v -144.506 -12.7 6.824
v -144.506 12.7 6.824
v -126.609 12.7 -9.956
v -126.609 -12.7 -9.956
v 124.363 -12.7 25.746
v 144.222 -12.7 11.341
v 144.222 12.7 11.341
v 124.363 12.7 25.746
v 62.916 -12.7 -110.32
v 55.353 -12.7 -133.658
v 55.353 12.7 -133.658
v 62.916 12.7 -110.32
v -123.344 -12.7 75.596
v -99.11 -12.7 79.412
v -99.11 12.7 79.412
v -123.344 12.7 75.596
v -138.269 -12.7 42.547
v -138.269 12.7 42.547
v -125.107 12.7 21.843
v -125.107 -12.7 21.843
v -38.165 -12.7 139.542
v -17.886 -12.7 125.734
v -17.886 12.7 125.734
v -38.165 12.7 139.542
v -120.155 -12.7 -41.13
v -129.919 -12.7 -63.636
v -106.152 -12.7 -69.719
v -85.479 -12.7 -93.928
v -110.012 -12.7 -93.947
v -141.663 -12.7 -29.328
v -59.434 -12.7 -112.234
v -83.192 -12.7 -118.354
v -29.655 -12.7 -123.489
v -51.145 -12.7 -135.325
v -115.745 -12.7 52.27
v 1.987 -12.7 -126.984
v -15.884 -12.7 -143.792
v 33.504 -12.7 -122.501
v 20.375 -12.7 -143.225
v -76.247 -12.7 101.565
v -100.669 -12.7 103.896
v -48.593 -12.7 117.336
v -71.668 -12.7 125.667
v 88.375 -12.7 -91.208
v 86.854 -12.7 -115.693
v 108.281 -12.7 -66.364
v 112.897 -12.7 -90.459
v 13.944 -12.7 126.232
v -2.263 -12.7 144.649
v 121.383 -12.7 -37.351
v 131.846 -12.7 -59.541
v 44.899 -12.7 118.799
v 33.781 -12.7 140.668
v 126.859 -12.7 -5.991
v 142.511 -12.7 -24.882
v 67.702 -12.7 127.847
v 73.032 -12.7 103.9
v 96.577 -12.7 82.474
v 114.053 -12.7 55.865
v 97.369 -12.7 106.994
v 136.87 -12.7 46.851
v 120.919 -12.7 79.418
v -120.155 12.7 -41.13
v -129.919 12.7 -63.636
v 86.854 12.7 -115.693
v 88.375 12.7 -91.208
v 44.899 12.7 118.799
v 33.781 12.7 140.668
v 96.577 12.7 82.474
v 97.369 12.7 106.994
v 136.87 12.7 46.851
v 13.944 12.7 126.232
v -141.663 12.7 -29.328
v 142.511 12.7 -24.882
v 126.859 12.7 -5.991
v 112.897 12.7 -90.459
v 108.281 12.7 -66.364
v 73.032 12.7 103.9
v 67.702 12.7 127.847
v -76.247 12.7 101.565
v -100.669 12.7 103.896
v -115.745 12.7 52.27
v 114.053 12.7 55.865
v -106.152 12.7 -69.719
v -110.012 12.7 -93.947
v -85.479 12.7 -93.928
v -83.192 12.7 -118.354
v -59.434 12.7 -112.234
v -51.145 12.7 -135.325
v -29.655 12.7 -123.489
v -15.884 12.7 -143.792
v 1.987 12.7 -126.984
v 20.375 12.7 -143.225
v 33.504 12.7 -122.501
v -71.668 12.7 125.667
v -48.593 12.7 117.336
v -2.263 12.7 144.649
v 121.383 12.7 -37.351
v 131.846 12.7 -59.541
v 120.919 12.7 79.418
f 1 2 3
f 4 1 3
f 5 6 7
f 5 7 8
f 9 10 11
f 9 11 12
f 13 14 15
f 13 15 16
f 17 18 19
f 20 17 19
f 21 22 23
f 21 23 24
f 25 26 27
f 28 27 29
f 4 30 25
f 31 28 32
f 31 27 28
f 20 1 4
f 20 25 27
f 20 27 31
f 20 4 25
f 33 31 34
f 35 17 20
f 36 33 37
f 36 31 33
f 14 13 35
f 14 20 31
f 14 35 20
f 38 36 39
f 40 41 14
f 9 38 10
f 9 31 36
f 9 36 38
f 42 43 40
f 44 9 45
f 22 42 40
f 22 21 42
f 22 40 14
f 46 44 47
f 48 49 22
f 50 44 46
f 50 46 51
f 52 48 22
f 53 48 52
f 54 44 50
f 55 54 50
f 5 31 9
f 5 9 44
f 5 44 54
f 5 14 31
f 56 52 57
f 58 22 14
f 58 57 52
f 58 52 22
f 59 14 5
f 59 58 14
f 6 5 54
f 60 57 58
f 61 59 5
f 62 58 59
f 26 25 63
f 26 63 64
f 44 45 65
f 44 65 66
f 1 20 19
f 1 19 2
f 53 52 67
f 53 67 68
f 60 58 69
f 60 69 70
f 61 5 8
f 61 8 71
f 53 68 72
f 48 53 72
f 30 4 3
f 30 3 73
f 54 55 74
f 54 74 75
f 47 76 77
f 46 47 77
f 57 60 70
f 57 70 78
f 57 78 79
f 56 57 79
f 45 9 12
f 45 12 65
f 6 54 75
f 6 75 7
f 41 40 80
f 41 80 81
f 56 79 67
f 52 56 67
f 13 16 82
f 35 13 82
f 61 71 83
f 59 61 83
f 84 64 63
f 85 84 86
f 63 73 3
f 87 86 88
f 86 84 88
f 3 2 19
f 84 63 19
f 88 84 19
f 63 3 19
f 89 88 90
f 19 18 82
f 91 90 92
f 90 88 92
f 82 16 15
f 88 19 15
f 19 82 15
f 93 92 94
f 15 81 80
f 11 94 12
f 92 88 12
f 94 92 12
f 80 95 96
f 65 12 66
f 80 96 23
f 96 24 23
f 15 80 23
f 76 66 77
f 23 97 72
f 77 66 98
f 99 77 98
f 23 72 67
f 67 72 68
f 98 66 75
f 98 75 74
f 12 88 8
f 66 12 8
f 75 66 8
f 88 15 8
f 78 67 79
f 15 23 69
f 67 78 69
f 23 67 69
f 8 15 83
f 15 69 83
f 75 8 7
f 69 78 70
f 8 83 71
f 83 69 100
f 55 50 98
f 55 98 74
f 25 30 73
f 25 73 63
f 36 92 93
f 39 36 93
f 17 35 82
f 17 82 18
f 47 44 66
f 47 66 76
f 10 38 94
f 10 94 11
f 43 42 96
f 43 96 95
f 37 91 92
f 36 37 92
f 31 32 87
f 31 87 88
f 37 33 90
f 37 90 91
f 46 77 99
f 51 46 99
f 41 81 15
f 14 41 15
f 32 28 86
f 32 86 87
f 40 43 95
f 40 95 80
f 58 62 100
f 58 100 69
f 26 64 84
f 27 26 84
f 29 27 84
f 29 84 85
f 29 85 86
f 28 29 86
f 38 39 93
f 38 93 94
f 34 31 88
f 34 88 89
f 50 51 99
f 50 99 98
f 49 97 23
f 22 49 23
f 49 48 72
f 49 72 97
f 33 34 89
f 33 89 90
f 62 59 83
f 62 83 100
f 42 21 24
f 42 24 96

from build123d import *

# Parameters (mm, degrees)
F0_R     = 127
F1_DEPTH = 12.7
F3_DEPTH = 25.4
F4_COUNT = 25


with BuildPart() as f1:
    # F0 (on Front) → F1 (new body, symmetric)
    with BuildSketch(Plane.XZ):
        Circle(F0_R)
    extrude(amount=F1_DEPTH, both=True)

    # F2 (on face) → F3 (join)
    with BuildSketch(Plane.XZ.offset(12.7)):
        Polygon((-2.263107348, 144.6492542012), (-17.8864400176, 125.7341451774), (13.9443057634, 126.2321525475), align=None)
    extrude(amount=-F3_DEPTH)

    # F4: F1 ×25 about axis
    f4_axis = Axis((0, 0, 0), (0, -1, 0))


with BuildPart() as f1_1:
    add(f1.part)
    for i in range(1, F4_COUNT):
        add(f1.part.rotate(f4_axis, i * 360 / F4_COUNT))


solid = f1_1.part
